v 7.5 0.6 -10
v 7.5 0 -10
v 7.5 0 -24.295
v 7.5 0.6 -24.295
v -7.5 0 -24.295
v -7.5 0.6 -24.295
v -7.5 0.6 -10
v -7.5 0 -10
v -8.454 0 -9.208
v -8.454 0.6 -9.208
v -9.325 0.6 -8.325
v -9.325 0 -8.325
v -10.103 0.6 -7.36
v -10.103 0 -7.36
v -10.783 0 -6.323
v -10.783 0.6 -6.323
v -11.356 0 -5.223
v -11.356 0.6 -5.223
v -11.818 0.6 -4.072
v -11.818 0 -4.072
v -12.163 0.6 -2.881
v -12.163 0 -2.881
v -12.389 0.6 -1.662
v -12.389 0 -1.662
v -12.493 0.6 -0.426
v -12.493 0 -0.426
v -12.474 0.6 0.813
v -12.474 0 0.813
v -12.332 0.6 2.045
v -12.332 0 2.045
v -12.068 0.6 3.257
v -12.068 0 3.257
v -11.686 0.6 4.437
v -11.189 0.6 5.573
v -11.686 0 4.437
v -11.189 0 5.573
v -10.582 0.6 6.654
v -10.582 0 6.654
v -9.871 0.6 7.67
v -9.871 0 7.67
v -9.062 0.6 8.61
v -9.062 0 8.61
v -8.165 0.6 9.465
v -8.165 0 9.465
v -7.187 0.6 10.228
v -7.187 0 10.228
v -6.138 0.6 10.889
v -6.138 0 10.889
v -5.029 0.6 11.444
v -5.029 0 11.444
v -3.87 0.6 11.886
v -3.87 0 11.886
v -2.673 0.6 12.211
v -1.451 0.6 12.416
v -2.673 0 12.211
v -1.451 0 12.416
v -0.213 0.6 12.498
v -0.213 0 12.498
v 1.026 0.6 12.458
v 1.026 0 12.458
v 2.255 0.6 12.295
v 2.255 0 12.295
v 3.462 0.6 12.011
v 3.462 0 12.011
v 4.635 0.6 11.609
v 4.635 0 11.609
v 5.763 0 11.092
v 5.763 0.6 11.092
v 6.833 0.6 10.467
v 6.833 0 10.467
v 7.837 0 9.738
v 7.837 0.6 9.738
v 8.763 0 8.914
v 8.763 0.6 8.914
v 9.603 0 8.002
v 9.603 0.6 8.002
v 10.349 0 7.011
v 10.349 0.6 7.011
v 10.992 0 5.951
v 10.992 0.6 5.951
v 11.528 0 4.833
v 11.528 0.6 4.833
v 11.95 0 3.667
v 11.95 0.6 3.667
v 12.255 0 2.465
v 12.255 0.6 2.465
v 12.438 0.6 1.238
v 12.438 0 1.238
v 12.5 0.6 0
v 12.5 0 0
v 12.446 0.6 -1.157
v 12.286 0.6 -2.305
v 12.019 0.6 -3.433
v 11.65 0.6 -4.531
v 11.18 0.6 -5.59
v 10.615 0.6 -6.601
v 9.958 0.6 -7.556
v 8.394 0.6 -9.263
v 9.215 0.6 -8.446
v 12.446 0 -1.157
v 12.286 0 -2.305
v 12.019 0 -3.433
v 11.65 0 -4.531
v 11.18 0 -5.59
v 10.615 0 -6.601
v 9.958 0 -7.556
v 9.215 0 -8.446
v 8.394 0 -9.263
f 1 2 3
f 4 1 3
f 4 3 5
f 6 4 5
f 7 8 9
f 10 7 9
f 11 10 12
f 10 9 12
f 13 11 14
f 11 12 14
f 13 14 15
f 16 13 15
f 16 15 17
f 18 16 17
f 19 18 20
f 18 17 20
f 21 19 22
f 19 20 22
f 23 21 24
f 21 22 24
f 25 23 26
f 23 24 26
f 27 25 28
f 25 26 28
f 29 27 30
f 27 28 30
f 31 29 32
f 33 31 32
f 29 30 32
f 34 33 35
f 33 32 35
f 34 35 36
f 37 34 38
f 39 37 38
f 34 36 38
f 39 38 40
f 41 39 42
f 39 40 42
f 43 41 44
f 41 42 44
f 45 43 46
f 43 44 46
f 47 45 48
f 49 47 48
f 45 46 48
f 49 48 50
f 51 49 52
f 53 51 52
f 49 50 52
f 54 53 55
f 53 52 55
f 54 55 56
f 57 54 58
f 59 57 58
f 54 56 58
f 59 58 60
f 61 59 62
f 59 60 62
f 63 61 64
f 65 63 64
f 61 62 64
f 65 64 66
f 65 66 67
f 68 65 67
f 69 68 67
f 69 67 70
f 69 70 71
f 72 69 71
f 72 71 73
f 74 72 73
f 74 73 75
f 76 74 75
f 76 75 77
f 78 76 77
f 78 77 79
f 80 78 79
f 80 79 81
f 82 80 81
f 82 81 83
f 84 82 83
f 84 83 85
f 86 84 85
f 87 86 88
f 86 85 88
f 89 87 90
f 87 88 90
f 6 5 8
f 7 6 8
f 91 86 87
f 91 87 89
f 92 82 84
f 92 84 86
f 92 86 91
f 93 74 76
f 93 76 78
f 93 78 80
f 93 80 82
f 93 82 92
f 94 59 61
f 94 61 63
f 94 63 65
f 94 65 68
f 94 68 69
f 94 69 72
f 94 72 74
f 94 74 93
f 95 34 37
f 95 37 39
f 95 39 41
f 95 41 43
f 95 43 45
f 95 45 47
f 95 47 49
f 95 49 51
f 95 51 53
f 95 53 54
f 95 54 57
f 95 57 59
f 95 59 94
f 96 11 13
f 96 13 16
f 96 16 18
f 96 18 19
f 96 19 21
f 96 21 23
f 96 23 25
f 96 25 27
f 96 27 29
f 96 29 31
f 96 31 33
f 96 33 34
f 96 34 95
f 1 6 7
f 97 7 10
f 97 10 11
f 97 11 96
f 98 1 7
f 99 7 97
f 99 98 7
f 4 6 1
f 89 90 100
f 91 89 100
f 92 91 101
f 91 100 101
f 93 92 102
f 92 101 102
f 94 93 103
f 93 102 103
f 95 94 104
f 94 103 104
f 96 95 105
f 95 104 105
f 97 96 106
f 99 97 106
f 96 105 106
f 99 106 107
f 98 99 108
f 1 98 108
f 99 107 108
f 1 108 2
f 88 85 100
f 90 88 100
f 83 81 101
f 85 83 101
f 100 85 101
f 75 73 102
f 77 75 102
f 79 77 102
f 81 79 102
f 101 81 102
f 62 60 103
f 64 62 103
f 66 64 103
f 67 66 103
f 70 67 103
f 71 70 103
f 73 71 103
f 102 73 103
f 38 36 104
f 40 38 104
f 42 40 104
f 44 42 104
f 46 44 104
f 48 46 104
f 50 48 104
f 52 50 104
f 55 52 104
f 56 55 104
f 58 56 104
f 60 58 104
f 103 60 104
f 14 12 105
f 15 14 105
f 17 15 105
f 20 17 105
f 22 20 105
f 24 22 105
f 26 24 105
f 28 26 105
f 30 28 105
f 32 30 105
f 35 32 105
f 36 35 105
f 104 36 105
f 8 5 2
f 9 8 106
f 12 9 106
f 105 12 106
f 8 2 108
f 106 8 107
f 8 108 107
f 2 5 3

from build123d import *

# Parameters (mm, degrees)
BOSS_EXTRUDE1_DEPTH = 0.6


with BuildPart() as part:
    # Sketch1 → Boss-Extrude1 (new body)
    with BuildSketch(Plane(origin=(0, 0, 0), x_dir=(1, 0, 0), z_dir=(0, 1, 0))):
        with BuildLine():
            ThreePointArc((7.5, 10), (0, 12.5), (-7.5, 10))
            Line((-7.5, 10), (-7.5, 0.704545455))
            Line((-7.5, 0.704545455), (7.5, 0.704545455))
            Line((7.5, 0.704545455), (7.5, 10))
        make_face()
        with BuildLine():
            Line((-7.5, 0.704545455), (-7.5, 10))
            ThreePointArc((-7.5, 10), (-5.590169944, -11.180339887), (12.5, 0))
            ThreePointArc((12.5, 0), (11.180339887, 5.590169944), (7.5, 10))
            Line((7.5, 10), (7.5, 0.704545455))
            Line((7.5, 0.704545455), (-7.5, 0.704545455))
        make_face()
        with BuildLine():
            Line((7.5, 24.295454545), (-7.5, 24.295454545))
            Line((-7.5, 24.295454545), (-7.5, 10))
            ThreePointArc((-7.5, 10), (0, 12.5), (7.5, 10))
            Line((7.5, 10), (7.5, 24.295454545))
        make_face()
    extrude(amount=BOSS_EXTRUDE1_DEPTH)


solid = part.part
